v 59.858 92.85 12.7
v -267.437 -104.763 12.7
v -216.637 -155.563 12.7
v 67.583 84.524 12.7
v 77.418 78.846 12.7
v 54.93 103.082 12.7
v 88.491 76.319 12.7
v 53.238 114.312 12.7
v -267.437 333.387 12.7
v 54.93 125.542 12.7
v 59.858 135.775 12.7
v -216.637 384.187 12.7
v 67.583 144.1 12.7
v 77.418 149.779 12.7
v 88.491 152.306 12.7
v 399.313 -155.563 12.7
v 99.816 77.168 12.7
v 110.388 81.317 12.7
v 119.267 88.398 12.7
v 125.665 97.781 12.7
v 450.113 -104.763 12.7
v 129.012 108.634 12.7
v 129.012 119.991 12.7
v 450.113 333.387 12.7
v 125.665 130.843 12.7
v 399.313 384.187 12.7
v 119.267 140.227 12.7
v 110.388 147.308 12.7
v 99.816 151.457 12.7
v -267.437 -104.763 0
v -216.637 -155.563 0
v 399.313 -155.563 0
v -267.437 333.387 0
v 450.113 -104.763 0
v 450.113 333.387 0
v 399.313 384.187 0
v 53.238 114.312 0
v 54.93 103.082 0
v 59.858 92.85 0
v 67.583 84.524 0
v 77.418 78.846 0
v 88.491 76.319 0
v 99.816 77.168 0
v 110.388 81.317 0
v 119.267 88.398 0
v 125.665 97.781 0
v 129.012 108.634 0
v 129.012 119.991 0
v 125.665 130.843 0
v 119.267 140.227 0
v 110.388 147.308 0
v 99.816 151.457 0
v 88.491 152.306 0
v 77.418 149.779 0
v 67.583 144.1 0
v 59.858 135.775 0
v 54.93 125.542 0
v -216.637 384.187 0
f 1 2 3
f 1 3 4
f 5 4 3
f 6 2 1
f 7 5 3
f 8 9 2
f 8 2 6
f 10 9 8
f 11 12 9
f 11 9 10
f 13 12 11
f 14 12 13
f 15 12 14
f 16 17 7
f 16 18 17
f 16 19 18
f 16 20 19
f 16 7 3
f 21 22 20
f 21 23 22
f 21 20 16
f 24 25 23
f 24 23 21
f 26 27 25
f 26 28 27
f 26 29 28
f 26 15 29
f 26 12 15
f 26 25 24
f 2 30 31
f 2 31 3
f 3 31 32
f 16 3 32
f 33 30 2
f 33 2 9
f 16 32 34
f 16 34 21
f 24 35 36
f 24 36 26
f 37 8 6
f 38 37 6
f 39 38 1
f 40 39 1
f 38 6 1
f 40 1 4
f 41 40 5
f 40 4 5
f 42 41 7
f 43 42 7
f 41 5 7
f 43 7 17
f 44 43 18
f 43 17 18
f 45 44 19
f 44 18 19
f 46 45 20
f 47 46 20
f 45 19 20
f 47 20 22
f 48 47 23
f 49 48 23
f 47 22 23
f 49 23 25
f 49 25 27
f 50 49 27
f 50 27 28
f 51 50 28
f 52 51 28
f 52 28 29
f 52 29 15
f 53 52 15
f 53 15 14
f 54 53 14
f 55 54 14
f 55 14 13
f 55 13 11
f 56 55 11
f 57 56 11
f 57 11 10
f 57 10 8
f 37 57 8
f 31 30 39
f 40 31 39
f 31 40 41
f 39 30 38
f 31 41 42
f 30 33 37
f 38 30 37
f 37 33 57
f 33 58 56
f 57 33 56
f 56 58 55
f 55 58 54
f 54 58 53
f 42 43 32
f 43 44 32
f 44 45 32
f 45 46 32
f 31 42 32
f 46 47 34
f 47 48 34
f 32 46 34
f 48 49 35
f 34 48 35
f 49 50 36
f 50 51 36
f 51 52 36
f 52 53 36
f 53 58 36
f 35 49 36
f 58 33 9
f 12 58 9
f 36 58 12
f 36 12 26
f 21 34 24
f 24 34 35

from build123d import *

# Parameters (mm, degrees)
F0_W     = 717.55
F0_H     = 539.75
F1_DEPTH = 12.7
F2_SIZE  = 50.8
F4_D     = 76.2


with BuildPart() as f1:
    # F0 (on Top) → F1 (new body)
    with BuildSketch(Plane.XY):
        with Locations((91.337793, 114.312262)):
            Rectangle(F0_W, F0_H)
    extrude(amount=F1_DEPTH)

    # F2
    f2_edges = [f1.edges().sort_by_distance(p)[0] for p in [
        (450.112793, 384.187262, 6.35),
        (450.112793, -155.562738, 6.35),
        (-267.437207, -155.562738, 6.35),
        (-267.437207, 384.187262, 6.35),
    ]]
    chamfer(f2_edges, length=F2_SIZE)

    # F4 (through all)
    with Locations(Plane(origin=(0, 0, 0), x_dir=(1, 0, 0), z_dir=(0, 0, -1))):
        with Locations((91.337793, -114.312262)):
            Hole(F4_D / 2)


solid = f1.part
